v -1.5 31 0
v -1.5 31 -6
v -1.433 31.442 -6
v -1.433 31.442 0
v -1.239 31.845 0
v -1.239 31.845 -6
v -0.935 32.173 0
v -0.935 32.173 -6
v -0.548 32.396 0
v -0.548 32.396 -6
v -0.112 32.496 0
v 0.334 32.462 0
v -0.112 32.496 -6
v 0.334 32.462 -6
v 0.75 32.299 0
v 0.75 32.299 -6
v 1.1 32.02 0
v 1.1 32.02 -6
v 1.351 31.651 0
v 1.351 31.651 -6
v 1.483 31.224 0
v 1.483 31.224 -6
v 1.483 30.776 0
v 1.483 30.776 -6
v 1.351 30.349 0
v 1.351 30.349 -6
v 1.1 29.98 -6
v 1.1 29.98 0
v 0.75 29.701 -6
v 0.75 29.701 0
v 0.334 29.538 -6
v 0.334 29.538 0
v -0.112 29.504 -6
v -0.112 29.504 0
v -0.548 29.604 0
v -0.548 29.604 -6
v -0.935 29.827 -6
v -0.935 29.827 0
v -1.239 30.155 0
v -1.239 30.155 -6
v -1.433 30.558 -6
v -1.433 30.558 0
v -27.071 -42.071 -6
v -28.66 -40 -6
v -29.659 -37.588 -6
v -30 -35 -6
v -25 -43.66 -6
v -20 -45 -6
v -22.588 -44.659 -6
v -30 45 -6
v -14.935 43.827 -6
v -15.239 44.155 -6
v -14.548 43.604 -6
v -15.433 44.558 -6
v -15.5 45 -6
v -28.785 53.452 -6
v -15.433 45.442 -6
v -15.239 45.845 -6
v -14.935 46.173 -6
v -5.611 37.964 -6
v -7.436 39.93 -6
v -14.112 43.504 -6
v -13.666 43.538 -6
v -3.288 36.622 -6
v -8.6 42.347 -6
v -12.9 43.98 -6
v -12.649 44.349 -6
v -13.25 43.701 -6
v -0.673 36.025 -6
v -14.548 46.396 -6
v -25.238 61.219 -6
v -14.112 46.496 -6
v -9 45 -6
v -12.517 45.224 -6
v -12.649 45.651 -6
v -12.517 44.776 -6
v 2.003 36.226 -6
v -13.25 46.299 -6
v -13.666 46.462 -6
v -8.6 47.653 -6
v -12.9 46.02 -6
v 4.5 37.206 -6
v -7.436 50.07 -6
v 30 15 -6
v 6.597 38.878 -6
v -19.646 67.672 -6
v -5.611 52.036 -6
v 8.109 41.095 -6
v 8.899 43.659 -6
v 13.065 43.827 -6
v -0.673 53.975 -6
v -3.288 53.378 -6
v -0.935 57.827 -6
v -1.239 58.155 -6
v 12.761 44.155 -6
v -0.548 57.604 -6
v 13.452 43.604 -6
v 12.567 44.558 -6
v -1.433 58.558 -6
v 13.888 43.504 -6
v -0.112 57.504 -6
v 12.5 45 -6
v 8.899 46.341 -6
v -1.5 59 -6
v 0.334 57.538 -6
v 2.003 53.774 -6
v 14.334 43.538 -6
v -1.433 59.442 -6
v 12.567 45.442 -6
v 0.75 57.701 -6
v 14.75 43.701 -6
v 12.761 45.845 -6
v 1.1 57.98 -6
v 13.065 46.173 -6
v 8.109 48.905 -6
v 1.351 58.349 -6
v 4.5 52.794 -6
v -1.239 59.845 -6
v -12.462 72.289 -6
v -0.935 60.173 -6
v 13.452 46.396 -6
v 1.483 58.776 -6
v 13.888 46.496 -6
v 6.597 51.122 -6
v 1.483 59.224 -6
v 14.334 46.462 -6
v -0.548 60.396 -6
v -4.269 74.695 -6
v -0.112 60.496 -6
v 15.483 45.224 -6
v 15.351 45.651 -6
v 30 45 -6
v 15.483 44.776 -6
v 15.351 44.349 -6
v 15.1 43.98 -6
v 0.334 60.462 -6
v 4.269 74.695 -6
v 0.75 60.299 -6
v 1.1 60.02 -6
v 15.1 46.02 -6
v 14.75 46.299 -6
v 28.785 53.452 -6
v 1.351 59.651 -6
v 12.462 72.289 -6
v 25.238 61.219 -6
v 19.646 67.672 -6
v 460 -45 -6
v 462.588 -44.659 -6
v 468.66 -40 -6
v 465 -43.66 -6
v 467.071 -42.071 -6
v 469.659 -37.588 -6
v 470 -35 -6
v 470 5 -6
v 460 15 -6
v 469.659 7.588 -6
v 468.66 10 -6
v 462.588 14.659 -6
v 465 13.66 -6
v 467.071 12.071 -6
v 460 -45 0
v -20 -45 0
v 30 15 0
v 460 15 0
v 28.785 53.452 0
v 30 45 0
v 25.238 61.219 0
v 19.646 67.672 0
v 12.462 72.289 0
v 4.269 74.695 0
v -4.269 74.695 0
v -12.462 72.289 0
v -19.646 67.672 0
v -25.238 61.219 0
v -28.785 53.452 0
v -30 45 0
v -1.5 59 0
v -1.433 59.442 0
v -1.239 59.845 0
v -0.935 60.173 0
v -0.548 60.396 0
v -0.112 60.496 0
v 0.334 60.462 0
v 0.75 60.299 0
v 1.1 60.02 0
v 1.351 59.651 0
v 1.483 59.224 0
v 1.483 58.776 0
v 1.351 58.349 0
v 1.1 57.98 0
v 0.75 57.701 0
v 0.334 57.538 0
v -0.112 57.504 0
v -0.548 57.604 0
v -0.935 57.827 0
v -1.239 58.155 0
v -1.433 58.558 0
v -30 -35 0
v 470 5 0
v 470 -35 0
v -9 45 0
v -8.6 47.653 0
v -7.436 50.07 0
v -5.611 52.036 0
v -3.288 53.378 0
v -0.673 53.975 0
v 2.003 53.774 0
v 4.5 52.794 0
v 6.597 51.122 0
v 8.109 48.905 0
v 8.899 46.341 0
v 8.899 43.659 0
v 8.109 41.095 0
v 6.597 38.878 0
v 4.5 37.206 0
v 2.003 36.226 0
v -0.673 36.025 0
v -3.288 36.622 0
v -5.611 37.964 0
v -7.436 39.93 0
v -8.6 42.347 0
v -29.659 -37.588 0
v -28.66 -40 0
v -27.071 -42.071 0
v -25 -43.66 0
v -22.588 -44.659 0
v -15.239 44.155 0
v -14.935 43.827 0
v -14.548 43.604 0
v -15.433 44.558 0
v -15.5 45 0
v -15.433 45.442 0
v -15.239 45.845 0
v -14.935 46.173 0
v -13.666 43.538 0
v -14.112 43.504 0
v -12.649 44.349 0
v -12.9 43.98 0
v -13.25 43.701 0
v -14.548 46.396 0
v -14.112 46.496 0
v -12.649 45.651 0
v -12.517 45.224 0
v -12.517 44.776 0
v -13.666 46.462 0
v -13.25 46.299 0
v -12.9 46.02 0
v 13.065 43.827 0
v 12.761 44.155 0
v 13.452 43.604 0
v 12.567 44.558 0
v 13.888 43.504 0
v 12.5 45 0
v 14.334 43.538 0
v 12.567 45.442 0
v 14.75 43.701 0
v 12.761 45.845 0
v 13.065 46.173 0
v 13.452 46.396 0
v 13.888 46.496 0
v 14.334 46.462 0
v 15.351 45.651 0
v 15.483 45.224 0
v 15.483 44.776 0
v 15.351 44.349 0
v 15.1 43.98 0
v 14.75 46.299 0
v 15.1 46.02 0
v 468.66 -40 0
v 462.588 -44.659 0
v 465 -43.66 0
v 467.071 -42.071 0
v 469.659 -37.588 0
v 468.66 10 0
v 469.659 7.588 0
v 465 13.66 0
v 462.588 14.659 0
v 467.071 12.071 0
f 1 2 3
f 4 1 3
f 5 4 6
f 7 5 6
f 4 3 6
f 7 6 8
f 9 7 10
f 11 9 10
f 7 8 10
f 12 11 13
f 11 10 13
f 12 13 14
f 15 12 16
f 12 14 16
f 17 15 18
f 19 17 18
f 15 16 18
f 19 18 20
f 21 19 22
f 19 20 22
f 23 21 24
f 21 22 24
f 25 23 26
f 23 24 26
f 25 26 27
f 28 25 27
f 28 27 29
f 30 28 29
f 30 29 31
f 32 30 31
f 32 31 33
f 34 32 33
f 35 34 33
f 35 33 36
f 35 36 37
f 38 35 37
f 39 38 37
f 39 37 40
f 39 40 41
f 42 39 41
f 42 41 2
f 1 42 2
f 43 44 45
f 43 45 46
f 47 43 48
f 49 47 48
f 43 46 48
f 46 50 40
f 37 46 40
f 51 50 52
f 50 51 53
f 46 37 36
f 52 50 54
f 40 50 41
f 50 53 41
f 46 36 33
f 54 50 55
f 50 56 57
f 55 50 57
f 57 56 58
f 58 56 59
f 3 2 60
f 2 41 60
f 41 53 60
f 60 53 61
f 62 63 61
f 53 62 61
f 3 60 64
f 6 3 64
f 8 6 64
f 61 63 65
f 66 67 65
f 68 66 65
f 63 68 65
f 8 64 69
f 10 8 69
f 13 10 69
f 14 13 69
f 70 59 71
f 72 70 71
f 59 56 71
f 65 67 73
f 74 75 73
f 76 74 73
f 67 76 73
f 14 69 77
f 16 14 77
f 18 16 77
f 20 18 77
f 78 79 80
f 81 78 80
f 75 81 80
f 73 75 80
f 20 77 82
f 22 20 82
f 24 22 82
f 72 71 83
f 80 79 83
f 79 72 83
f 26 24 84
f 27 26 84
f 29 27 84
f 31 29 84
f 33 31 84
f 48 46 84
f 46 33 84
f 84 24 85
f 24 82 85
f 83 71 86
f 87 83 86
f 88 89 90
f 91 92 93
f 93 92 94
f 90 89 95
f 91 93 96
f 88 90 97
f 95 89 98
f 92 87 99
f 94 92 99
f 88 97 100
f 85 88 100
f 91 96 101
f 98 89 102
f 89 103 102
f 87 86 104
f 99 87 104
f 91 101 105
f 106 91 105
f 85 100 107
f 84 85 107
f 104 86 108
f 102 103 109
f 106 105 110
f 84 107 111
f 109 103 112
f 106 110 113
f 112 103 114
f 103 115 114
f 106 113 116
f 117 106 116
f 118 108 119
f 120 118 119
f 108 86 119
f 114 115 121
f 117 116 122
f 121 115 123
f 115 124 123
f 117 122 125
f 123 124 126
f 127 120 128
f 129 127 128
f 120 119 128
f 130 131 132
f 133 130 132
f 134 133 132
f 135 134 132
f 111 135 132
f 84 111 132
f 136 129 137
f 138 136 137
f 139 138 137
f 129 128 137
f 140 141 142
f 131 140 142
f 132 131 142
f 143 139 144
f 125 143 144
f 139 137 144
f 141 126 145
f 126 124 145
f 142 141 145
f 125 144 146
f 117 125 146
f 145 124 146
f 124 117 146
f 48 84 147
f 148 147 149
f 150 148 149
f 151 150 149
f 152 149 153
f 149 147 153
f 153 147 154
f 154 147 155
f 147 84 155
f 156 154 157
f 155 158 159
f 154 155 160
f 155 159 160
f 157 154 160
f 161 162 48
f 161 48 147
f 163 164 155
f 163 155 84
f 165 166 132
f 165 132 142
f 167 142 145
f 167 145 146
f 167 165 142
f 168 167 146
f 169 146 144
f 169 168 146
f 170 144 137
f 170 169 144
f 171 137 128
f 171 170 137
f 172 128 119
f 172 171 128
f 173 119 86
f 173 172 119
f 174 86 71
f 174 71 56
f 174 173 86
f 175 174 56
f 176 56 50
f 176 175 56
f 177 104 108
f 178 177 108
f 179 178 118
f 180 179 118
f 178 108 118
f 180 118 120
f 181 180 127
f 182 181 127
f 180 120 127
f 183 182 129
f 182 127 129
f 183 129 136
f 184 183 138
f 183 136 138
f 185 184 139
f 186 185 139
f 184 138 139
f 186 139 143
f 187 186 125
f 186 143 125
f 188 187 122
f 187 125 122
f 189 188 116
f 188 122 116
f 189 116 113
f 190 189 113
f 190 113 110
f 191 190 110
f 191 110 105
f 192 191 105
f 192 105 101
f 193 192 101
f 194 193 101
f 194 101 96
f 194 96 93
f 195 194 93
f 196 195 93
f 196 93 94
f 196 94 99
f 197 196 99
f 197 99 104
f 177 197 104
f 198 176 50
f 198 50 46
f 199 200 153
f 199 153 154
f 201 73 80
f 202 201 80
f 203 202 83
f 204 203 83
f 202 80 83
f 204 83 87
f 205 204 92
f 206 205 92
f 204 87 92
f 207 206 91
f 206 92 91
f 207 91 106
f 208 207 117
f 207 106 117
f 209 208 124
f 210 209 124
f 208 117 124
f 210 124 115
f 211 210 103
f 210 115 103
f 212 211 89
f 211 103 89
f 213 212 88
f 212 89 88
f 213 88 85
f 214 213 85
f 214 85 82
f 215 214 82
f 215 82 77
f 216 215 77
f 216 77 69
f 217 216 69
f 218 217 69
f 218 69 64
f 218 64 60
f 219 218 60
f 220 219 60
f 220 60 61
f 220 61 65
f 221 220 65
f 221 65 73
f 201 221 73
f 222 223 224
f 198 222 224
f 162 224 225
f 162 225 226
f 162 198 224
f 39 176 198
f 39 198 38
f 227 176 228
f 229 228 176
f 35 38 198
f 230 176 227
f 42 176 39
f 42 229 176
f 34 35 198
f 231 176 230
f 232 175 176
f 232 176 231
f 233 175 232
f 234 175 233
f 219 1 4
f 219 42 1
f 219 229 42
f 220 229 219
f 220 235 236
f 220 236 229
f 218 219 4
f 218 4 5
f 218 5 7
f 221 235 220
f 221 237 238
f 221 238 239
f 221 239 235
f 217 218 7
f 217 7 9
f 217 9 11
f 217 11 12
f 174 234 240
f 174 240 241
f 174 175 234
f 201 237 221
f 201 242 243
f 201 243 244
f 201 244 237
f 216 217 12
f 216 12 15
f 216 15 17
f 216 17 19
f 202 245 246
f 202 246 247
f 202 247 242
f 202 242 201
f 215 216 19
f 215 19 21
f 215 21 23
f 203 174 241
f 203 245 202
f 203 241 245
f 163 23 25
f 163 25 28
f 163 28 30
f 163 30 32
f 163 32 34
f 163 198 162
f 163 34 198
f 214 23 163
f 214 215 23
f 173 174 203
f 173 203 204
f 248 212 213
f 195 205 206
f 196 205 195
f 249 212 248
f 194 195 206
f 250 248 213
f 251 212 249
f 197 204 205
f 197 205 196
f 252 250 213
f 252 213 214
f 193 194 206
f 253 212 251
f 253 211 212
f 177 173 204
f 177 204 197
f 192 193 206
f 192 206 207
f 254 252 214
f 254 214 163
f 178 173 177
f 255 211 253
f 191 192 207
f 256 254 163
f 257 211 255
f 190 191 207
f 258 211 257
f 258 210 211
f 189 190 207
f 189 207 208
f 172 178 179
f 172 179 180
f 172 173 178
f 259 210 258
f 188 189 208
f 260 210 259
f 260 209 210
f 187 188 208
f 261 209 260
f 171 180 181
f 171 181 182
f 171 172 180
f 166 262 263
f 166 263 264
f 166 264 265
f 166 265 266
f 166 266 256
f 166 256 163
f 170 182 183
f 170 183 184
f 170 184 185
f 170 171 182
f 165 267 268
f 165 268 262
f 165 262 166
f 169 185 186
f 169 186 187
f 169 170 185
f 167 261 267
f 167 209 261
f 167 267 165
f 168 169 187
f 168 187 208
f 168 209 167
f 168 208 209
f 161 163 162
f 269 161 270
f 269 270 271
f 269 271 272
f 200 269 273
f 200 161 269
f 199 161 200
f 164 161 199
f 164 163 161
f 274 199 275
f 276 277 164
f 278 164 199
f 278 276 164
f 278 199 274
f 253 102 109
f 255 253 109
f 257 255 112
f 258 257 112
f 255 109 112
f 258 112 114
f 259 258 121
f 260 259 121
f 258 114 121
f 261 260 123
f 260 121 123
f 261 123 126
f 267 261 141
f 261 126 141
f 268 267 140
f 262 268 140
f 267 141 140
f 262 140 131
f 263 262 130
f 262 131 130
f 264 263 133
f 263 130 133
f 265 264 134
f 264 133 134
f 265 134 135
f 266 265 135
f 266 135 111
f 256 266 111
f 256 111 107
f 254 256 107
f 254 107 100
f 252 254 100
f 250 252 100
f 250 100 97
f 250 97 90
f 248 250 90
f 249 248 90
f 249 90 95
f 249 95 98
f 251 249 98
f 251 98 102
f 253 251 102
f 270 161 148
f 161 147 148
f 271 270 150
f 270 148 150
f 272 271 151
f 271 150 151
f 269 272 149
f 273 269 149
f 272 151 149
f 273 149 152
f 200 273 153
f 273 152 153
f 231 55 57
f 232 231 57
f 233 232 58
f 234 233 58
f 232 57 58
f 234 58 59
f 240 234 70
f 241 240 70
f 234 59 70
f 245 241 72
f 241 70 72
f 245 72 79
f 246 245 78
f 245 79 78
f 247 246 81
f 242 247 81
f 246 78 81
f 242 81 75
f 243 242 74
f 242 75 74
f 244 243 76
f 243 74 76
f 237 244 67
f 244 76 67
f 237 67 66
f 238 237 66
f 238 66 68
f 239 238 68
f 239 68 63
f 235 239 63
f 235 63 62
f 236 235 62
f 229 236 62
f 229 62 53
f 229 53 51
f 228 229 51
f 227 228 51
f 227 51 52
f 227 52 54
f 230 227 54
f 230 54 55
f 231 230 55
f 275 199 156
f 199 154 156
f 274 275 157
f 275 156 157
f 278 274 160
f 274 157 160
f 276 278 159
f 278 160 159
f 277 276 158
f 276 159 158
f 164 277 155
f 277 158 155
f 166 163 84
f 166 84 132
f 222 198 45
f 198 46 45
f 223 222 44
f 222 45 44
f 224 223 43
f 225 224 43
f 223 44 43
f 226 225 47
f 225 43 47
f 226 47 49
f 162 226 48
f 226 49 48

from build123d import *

# Parameters (mm, degrees)
SALIENTE_EXTRUIR1_DEPTH = 6
REDONDEO1_R             = 10
REDONDEO2_R             = 10
CROQUIS2_R              = 9
CORTAR_EXTRUIR1_DEPTH   = 476.984243437
CROQUIS3_R              = 1.5
CORTAR_EXTRUIR2_DEPTH   = 476.984243437


with BuildPart() as part:
    # Croquis1 → Saliente-Extruir1 (new body)
    with BuildSketch(Plane.XY):
        with BuildLine():
            Line((30, -45), (470, -45))
            Line((470, -45), (470, 15))
            Line((470, 15), (30, 15))
            Line((30, 15), (30, 45))
            ThreePointArc((30, 45), (0, 75), (-30, 45))
            Line((-30, 45), (-30, -45))
            Line((-30, -45), (30, -45))
        make_face()
    extrude(amount=-SALIENTE_EXTRUIR1_DEPTH)

    # Redondeo1
    redondeo1_edges = [part.edges().sort_by_distance(p)[0] for p in [
        (-30, -45, -3),
    ]]
    fillet(redondeo1_edges, radius=REDONDEO1_R)

    # Redondeo2
    redondeo2_edges = [part.edges().sort_by_distance(p)[0] for p in [
        (470, 15, -3),
        (470, -45, -3),
    ]]
    fillet(redondeo2_edges, radius=REDONDEO2_R)

    # Croquis2 → Cortar-Extruir1 (cut, through all)
    with BuildSketch(Plane(origin=(0, 0, -6), x_dir=(-1, 0, 0), z_dir=(0, 0, -1))):
        with Locations((0, 45)):
            Circle(CROQUIS2_R)
    extrude(amount=-CORTAR_EXTRUIR1_DEPTH, mode=Mode.SUBTRACT)

    # Croquis3 → Cortar-Extruir2 (cut, through all)
    with BuildSketch(Plane(origin=(0, 0, -6), x_dir=(-1, 0, 0), z_dir=(0, 0, -1))):
        with Locations((0, 31)):
            Circle(CROQUIS3_R)
        with Locations((14, 45)):
            Circle(CROQUIS3_R)
        with Locations((0, 59)):
            Circle(CROQUIS3_R)
        with Locations((-14, 45)):
            Circle(CROQUIS3_R)
    extrude(amount=-CORTAR_EXTRUIR2_DEPTH, mode=Mode.SUBTRACT)


solid = part.part
